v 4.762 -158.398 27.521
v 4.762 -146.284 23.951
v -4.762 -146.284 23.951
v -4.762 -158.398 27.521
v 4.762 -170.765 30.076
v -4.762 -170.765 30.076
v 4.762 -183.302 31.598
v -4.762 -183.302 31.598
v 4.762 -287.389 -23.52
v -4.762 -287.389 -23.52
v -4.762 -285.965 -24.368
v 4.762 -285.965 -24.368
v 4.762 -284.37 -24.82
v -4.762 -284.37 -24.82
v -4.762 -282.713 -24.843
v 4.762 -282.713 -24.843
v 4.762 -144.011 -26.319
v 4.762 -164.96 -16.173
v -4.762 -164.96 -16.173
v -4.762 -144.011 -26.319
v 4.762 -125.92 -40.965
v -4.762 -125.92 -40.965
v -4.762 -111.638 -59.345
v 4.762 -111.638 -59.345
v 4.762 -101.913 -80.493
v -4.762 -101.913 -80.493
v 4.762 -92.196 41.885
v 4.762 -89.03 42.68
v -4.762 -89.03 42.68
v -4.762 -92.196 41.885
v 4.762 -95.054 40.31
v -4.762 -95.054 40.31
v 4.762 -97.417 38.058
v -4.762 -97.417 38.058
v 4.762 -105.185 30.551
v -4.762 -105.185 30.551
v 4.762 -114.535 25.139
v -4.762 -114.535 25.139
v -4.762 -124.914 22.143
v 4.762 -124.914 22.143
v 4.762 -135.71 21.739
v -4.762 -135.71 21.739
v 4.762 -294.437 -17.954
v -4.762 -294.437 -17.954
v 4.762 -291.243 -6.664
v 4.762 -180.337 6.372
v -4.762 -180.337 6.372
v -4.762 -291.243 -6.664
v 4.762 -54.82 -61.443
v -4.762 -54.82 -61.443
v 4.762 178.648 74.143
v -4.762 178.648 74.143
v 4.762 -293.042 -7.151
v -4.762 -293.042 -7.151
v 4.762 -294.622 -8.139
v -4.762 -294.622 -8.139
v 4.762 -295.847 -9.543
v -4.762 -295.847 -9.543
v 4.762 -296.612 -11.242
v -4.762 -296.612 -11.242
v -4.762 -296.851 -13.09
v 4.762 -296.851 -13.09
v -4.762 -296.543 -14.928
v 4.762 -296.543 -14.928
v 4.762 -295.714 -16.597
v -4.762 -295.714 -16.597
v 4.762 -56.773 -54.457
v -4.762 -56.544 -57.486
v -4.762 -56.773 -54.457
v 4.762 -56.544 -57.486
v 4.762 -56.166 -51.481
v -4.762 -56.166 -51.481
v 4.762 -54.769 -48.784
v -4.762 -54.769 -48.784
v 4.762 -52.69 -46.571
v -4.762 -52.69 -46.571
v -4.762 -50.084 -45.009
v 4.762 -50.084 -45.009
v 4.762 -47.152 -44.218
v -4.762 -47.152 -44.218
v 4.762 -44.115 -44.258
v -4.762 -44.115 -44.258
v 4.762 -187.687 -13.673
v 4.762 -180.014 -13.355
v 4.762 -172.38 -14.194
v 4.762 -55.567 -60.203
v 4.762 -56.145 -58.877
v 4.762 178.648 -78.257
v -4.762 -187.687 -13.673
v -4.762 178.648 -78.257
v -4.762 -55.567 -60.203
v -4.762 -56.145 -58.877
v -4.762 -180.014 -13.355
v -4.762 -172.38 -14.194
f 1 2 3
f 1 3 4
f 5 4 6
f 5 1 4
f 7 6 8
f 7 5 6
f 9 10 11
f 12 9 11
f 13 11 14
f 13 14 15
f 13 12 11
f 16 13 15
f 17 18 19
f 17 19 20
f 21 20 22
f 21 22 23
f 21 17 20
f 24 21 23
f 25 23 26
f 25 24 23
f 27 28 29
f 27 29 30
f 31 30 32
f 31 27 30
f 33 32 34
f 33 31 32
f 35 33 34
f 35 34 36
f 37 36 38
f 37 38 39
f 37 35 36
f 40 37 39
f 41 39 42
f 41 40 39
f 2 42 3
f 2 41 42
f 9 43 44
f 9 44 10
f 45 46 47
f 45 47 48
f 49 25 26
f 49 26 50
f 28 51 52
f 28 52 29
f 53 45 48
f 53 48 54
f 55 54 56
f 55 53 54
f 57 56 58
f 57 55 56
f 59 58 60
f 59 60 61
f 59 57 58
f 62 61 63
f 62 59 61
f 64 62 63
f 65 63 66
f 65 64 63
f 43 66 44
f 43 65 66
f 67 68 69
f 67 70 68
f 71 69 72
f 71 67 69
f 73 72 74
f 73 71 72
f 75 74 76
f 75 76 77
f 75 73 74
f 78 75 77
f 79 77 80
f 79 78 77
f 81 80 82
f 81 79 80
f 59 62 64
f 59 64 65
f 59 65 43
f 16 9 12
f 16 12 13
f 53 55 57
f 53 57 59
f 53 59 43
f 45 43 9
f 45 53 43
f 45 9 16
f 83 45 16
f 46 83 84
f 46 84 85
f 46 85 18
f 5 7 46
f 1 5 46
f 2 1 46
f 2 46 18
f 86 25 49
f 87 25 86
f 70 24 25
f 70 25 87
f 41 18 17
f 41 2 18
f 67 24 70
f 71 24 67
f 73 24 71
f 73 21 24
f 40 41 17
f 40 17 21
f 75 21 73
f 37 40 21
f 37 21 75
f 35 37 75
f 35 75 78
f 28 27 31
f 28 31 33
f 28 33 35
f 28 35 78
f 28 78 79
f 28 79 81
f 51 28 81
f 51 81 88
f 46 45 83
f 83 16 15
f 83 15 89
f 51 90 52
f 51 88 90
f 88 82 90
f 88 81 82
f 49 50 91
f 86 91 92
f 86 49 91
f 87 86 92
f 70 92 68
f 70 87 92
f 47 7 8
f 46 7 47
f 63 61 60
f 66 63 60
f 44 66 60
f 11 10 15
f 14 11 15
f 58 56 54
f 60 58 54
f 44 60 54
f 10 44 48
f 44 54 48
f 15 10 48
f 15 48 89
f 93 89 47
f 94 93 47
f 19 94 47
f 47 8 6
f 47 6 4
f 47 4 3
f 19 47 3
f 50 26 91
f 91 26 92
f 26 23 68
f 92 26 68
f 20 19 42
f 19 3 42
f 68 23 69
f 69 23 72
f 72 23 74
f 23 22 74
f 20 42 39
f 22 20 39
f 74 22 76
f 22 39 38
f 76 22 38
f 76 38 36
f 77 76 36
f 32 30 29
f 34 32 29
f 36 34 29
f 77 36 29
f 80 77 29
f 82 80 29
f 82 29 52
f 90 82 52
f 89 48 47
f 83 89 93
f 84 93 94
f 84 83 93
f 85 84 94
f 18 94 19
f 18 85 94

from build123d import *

# Parameters (mm, degrees)
F1_DEPTH = 4.7625


with BuildPart() as f1:
    # F0 (on Right) → F1 (new body, symmetric)
    with BuildSketch(Plane.YZ):
        with BuildLine():
            Line((178.64784, -78.256549), (178.64784, 74.143451))
            Line((178.64784, 74.143451), (-89.029852, 42.679582))
            ThreePointArc((-89.029852, 42.679582), (-93.675787, 41.189865), (-97.417243, 38.058494))
            ThreePointArc((-97.417243, 38.058494), (-119.633425, 23.324748), (-146.283933, 23.951184))
            ThreePointArc((-146.283933, 23.951184), (-164.555034, 28.926971), (-183.30216, 31.598451))
            Line((-183.30216, 31.598451), (-180.33696, 6.372124))
            Line((-180.33696, 6.372124), (-291.243161, -6.664219))
            ThreePointArc((-291.243161, -6.664219), (-296.612067, -11.242249), (-294.43711, -17.954406))
            Line((-294.43711, -17.954406), (-287.389228, -23.519688))
            ThreePointArc((-287.389228, -23.519688), (-285.182532, -24.646288), (-282.71268, -24.842665))
            Line((-282.71268, -24.842665), (-187.686579, -13.67293))
            ThreePointArc((-187.686579, -13.67293), (-176.18102, -13.63024), (-164.959982, -16.173468))
            ThreePointArc((-164.959982, -16.173468), (-125.920012, -40.965213), (-101.91306, -80.492622))
            Line((-101.91306, -80.492622), (-54.8202, -61.442622))
            ThreePointArc((-54.8202, -61.442622), (-55.877698, -59.54941), (-56.543876, -57.485735))
            ThreePointArc((-56.543876, -57.485735), (-53.806121, -47.605216), (-44.114969, -44.258345))
            Line((-44.114969, -44.258345), (178.64784, -78.256549))
        make_face()
    extrude(amount=F1_DEPTH, both=True)


solid = f1.part
